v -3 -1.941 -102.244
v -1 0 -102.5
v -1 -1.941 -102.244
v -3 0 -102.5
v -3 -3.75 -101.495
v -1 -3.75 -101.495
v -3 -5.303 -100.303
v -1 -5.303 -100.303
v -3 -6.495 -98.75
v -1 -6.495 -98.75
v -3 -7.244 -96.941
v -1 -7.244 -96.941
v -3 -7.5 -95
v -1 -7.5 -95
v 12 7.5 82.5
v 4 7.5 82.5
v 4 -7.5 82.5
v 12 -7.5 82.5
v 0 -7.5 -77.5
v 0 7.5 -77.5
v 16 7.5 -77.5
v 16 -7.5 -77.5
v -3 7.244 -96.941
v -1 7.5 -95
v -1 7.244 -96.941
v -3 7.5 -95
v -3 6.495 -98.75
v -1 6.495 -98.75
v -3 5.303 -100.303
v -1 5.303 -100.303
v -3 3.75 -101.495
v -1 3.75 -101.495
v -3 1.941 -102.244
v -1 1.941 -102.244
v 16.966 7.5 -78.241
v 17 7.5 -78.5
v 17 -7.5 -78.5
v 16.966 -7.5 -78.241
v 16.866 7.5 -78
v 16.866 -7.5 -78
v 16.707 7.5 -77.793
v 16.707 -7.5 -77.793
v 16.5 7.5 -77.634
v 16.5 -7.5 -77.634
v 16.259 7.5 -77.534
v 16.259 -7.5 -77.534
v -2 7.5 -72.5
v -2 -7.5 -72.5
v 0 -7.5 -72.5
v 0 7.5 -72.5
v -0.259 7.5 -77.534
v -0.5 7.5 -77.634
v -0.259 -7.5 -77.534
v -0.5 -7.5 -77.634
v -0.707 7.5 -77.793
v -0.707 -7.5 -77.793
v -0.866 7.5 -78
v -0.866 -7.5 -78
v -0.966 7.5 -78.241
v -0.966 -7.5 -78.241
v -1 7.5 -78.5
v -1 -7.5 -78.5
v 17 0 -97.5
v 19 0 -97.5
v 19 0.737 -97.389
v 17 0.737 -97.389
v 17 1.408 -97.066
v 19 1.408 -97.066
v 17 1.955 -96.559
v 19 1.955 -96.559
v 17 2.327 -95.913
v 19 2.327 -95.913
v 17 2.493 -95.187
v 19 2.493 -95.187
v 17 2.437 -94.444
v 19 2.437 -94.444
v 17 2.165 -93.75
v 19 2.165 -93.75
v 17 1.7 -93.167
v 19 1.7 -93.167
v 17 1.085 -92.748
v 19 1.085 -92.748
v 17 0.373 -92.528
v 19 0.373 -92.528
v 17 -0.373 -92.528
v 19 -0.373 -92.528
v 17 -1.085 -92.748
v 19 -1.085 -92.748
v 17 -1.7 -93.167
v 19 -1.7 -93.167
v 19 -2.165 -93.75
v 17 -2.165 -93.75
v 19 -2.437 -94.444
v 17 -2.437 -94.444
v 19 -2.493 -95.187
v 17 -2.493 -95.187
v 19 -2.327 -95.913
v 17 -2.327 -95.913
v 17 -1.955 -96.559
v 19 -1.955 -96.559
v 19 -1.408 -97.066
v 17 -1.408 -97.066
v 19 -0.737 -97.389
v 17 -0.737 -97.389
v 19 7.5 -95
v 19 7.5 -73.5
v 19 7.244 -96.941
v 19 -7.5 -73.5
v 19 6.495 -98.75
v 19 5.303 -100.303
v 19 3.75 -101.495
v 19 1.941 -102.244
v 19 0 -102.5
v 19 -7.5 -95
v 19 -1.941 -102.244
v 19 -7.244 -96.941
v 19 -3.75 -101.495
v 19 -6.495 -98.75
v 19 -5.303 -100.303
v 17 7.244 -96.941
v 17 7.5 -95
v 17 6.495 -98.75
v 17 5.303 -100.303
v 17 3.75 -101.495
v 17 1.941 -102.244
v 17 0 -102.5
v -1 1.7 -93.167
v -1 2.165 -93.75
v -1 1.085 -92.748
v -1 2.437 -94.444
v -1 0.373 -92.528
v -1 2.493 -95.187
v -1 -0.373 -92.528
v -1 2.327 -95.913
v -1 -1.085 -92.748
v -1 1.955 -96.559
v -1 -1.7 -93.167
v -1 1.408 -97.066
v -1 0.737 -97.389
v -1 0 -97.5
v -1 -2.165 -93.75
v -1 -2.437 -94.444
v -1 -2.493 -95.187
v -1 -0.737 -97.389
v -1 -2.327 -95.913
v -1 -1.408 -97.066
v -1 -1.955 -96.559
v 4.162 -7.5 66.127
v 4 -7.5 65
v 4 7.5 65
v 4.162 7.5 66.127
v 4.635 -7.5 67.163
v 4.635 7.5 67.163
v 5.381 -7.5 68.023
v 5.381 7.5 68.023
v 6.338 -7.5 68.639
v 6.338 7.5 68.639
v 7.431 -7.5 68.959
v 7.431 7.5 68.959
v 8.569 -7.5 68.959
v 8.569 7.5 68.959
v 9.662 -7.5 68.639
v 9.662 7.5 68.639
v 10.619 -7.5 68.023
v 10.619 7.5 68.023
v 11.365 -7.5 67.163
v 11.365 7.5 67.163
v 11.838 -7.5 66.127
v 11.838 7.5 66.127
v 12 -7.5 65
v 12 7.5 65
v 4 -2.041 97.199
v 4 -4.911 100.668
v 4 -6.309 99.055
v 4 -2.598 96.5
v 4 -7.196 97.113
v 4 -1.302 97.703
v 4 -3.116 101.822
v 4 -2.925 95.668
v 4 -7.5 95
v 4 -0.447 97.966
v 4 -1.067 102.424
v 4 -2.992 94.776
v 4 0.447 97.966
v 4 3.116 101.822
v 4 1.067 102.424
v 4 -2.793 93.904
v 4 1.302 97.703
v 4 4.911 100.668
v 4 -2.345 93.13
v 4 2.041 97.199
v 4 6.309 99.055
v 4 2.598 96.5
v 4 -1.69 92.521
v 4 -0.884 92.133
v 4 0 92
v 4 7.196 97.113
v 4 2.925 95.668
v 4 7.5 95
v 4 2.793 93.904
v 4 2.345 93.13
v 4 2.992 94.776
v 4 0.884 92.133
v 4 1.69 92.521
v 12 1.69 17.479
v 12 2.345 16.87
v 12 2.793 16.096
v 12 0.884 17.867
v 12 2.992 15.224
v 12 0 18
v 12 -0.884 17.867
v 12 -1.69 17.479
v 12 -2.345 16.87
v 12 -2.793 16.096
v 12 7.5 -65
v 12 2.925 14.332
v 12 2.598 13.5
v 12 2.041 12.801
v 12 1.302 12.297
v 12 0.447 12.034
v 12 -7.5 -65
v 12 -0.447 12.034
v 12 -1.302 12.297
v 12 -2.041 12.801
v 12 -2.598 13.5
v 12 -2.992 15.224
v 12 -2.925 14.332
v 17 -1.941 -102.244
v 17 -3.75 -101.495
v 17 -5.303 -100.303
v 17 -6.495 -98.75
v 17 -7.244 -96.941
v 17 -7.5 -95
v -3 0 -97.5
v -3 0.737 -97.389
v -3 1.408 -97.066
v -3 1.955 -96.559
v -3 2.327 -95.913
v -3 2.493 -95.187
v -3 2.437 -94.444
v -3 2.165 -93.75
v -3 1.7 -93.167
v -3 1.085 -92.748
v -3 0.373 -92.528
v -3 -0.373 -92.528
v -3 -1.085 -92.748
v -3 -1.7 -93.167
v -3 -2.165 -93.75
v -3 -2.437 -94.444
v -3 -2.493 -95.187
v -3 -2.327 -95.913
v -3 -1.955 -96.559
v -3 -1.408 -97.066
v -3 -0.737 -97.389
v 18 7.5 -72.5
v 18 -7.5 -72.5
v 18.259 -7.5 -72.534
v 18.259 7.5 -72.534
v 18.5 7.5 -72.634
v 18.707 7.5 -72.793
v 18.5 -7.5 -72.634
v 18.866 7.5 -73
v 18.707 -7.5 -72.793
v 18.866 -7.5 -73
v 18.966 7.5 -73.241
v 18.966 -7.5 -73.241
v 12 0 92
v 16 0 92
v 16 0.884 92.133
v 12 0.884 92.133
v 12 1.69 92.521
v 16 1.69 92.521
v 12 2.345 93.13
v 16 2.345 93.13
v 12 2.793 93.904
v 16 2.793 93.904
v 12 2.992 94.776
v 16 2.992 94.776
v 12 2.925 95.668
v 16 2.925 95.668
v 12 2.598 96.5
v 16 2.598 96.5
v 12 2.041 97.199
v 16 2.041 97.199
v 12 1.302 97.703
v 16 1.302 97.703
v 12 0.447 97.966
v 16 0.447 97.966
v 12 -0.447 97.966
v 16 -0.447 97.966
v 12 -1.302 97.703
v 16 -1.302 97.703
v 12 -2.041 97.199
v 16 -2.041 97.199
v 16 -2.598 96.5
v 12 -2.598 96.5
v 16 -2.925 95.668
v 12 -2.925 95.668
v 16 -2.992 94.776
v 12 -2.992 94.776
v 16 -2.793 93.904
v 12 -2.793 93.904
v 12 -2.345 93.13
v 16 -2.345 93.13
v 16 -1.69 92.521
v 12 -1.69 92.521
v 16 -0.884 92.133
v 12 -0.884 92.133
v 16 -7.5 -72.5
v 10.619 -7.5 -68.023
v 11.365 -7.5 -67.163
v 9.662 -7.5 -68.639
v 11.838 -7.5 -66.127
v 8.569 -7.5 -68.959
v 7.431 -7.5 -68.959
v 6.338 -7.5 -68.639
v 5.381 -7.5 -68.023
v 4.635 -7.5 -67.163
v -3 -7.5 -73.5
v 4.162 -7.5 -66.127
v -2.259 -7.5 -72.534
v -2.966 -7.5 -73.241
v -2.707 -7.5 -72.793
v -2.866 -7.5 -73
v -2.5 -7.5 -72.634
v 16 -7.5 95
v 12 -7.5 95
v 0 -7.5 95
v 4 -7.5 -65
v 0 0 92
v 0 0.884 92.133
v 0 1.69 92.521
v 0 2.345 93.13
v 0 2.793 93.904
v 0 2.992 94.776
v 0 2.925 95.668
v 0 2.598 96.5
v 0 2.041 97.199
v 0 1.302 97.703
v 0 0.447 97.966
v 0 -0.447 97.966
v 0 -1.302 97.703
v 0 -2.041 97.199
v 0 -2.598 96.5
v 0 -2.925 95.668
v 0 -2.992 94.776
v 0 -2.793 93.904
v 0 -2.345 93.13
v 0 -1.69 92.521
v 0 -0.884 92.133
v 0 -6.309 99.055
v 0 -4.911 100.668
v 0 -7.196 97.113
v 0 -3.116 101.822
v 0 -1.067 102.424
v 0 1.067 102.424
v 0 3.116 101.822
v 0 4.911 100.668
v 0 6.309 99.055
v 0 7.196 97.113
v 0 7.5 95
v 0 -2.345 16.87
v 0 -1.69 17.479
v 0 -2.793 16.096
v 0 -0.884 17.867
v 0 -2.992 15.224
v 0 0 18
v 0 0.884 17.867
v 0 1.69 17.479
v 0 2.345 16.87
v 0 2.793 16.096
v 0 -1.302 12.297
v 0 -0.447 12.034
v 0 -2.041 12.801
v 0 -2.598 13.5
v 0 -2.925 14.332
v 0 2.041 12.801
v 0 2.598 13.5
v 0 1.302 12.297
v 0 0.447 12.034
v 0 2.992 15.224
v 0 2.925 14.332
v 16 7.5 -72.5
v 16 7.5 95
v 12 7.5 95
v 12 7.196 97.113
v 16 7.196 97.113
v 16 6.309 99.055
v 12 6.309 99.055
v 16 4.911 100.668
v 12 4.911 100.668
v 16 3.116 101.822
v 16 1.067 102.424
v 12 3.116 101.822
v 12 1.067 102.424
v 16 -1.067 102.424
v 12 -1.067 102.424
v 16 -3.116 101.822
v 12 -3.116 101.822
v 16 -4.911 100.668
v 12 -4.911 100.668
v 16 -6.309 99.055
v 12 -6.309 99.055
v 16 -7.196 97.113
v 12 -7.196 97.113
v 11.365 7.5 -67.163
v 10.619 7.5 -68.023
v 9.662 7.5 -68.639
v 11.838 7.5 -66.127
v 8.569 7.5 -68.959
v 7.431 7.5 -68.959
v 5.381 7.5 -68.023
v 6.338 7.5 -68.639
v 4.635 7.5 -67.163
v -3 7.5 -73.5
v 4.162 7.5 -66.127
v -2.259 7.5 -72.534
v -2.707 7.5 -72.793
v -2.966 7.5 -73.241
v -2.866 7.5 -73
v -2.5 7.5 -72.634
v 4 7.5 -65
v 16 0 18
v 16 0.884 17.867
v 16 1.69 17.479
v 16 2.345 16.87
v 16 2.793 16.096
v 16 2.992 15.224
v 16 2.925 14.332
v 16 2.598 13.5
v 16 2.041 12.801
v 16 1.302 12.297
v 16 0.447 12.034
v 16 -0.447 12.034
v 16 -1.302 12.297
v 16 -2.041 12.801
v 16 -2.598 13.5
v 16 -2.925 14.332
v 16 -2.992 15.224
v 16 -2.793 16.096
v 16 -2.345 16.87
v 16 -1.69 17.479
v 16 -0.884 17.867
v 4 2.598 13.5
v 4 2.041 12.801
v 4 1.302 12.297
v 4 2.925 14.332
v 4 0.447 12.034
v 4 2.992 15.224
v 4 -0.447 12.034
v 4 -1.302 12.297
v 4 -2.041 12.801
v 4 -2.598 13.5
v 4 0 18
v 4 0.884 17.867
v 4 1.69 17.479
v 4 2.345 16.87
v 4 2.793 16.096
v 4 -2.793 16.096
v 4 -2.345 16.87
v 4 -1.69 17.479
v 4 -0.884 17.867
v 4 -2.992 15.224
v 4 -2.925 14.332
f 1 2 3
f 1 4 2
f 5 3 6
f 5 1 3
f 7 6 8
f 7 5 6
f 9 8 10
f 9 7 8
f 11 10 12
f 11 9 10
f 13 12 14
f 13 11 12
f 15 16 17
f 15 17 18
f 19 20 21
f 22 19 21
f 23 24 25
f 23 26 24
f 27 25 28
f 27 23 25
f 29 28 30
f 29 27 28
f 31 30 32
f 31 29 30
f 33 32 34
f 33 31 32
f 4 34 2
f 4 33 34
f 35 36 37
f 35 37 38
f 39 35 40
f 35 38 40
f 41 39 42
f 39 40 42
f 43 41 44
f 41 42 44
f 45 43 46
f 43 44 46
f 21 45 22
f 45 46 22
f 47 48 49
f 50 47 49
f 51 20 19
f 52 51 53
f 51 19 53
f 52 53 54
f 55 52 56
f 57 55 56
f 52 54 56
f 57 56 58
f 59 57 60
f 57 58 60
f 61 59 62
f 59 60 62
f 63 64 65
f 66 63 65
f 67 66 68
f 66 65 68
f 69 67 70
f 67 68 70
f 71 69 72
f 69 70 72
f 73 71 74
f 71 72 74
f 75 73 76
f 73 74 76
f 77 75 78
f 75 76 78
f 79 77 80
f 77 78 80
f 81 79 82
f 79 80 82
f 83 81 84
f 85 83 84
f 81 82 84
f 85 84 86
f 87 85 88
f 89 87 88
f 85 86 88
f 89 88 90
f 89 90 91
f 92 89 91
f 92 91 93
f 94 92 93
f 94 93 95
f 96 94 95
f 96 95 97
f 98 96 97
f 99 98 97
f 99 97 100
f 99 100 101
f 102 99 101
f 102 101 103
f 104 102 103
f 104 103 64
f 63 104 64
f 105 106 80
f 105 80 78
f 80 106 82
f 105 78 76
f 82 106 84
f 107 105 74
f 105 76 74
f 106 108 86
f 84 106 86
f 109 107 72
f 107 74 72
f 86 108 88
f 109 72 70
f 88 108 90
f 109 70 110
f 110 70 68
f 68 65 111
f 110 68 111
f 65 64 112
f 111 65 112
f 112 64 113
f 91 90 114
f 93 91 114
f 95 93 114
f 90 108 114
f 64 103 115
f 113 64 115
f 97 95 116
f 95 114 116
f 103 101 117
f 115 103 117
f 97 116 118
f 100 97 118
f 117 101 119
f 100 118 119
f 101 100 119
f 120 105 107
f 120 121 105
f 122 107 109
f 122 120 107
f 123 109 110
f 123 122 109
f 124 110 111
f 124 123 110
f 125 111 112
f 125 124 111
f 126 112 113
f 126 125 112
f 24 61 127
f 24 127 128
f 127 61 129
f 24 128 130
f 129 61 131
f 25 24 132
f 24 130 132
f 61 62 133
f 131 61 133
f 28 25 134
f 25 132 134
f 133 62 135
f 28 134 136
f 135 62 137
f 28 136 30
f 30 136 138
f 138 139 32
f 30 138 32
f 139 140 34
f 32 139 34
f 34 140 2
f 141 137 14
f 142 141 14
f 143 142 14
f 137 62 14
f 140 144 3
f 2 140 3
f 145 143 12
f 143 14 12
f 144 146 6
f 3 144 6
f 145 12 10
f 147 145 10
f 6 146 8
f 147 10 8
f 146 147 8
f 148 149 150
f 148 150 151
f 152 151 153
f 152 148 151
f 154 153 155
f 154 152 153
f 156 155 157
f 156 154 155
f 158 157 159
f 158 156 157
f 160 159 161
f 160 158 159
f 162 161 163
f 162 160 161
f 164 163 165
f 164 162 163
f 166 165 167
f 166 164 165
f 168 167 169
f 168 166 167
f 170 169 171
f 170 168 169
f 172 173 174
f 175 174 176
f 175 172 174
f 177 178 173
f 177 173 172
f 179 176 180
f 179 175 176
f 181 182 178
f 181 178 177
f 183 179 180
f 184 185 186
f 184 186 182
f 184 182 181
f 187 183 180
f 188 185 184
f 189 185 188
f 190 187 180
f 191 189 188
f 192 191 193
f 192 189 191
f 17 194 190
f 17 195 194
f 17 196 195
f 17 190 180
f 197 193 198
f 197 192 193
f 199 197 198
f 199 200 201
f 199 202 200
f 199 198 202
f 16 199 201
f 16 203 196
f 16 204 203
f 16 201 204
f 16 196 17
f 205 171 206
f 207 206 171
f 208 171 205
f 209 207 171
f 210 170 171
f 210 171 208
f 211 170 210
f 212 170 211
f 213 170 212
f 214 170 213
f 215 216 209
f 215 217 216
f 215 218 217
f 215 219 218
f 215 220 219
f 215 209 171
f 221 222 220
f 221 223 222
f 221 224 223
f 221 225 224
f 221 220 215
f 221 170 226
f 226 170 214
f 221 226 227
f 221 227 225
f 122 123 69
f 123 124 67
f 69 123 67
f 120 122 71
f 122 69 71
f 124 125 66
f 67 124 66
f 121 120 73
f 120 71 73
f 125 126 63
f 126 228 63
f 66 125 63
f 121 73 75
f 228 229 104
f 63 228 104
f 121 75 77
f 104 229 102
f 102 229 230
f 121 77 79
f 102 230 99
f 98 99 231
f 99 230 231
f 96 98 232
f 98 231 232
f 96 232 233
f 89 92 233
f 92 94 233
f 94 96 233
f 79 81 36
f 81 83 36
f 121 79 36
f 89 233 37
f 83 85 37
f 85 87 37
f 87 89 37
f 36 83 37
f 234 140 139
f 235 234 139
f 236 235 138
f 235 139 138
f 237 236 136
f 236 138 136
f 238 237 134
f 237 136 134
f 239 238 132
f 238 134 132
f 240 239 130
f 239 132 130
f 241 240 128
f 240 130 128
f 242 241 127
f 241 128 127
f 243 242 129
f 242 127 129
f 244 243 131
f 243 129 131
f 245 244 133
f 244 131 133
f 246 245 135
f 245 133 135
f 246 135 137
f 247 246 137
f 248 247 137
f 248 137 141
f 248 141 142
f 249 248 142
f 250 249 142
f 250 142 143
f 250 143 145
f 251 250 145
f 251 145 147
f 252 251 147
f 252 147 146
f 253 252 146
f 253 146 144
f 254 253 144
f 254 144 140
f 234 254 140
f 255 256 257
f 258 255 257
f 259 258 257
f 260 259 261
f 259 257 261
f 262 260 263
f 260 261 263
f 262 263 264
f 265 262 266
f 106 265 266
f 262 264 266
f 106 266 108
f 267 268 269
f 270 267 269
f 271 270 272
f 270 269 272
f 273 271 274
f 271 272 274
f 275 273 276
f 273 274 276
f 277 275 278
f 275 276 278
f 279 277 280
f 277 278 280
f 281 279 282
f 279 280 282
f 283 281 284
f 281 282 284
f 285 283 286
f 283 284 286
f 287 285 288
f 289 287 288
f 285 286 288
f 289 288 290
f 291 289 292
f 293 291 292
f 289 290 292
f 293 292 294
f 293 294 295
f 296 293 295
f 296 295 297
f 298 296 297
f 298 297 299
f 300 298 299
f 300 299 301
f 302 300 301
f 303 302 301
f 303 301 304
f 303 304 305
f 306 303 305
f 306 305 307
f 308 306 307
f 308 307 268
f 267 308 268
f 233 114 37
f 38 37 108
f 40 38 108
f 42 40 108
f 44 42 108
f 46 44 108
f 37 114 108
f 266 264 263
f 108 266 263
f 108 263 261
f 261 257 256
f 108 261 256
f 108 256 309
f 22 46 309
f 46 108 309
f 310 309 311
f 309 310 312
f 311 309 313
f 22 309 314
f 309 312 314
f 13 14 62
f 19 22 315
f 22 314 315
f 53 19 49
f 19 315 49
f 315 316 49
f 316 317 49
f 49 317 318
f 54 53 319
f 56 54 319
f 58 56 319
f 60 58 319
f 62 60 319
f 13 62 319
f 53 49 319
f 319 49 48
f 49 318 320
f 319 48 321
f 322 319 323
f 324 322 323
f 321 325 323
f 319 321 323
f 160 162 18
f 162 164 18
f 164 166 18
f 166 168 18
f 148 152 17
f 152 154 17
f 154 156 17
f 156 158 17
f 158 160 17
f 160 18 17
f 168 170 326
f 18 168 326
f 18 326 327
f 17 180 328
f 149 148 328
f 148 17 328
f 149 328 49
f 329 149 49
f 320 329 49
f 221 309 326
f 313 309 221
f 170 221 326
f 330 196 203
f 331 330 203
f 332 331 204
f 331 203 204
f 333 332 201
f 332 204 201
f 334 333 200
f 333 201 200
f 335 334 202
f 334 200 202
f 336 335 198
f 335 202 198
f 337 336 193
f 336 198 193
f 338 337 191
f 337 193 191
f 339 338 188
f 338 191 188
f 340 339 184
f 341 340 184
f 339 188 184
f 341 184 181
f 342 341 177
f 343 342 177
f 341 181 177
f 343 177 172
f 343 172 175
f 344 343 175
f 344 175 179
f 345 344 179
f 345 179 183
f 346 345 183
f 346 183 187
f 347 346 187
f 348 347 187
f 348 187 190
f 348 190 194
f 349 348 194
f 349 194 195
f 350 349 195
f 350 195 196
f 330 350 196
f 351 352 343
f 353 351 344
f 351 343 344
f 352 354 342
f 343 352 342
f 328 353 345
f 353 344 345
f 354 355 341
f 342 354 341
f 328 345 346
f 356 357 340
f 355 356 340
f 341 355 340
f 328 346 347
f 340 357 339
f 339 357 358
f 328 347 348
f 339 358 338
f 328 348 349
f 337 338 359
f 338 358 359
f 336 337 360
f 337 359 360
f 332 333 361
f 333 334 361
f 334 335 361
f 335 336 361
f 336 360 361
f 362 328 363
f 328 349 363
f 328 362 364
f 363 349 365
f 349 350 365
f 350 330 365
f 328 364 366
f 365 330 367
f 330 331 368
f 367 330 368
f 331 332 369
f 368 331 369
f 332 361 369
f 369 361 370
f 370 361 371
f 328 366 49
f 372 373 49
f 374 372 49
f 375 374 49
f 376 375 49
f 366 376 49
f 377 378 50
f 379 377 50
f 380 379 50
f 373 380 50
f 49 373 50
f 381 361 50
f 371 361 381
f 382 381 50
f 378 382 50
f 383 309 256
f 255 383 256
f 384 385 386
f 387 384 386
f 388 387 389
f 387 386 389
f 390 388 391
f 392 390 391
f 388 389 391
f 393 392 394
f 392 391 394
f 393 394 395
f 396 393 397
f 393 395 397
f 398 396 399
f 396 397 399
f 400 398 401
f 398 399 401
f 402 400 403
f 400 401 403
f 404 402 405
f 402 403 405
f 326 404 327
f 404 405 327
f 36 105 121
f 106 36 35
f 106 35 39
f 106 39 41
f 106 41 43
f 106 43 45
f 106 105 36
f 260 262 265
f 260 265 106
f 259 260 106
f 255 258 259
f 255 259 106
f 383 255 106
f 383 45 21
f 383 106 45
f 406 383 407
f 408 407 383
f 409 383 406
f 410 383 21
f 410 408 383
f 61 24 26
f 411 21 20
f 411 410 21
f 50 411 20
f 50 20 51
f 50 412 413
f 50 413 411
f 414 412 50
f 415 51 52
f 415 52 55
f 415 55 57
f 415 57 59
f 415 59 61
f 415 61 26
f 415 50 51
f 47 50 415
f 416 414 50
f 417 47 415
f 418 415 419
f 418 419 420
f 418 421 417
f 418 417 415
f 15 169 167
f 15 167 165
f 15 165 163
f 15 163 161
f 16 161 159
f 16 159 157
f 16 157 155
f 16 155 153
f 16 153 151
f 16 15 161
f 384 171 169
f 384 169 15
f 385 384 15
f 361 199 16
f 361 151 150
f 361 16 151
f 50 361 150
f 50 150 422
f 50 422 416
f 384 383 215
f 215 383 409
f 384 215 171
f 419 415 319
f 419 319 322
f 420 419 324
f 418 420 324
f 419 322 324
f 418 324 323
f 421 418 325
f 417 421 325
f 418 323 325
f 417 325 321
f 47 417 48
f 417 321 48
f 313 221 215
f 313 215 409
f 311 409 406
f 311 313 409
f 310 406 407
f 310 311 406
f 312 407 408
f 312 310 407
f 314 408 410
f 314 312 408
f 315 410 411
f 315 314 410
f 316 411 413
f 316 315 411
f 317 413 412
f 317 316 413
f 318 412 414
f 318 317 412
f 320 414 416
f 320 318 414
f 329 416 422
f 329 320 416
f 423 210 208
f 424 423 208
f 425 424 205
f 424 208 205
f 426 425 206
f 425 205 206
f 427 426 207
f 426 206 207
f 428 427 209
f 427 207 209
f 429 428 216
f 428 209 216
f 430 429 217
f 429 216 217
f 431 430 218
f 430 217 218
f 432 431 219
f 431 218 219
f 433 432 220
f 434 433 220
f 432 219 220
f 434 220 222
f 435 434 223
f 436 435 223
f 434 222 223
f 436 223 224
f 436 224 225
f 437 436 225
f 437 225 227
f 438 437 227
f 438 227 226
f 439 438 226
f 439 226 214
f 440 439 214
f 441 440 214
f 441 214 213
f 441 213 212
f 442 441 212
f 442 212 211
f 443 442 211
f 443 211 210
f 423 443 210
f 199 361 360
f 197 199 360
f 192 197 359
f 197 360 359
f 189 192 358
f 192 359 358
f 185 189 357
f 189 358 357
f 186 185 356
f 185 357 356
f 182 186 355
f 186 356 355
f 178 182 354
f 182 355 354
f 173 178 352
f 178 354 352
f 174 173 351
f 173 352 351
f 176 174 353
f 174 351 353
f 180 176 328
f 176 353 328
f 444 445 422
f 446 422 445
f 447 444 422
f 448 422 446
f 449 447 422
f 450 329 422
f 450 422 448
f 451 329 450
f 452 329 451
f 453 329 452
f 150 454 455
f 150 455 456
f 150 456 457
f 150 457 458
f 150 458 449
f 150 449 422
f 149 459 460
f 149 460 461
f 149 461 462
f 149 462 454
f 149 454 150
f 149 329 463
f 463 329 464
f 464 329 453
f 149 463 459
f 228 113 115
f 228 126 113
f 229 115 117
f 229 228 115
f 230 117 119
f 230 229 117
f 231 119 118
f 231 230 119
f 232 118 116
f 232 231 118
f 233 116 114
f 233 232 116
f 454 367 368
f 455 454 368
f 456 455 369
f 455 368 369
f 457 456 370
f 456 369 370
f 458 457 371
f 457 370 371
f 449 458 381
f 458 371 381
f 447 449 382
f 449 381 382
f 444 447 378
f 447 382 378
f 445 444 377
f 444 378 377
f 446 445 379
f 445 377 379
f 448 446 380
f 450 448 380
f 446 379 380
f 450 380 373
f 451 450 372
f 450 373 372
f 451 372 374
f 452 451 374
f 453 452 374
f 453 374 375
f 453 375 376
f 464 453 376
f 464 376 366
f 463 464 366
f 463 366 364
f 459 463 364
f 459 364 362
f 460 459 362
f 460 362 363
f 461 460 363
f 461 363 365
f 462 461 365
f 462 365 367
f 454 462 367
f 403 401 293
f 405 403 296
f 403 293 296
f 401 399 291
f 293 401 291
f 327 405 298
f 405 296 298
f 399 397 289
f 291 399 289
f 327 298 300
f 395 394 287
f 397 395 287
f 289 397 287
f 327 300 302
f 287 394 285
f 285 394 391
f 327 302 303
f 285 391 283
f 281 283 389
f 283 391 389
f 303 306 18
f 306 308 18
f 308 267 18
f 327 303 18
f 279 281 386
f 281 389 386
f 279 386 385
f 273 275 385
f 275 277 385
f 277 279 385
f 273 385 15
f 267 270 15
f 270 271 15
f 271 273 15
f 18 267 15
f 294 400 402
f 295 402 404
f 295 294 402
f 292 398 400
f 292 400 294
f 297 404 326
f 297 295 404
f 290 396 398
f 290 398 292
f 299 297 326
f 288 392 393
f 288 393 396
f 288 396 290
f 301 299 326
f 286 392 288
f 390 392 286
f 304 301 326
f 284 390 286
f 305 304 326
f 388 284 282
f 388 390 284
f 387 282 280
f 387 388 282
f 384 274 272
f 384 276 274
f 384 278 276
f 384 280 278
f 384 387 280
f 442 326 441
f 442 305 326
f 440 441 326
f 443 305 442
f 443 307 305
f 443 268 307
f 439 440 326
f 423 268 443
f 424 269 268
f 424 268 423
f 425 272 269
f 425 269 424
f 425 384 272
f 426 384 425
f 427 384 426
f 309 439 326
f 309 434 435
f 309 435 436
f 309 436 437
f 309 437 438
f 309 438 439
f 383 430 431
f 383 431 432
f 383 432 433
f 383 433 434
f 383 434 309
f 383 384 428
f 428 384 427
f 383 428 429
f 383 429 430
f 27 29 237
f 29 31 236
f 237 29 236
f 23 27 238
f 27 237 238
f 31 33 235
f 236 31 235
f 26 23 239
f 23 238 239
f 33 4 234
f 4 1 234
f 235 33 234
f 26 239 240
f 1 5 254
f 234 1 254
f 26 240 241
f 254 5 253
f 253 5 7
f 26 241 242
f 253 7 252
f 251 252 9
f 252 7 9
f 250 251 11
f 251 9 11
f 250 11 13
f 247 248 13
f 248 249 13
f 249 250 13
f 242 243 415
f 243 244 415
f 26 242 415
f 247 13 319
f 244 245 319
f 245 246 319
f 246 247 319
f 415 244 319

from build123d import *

# Parameters (mm, degrees)
EXTRUDE_1_DEPTH     = 16
SKETCH_3_W          = 8
SKETCH_3_H          = 20
SKETCH_3_H_2        = 25
CUT_EXTRUDE_1_DEPTH = 105.820083953
SKETCH_4_R          = 3
SKETCH_4_R_2        = 6
CUT_EXTRUDE_2_DEPTH = 105.012018536
CUT_EXTRUDE_3_DEPTH = 105.820083953
SKETCH_6_R          = 3
CUT_EXTRUDE_4_DEPTH = 105.012018536
EXTRUDE_2_DEPTH     = 15
CUT_EXTRUDE_START   = -15
CUT_EXTRUDE_5_DEPTH = 15
FILLET_1_R          = 7.5
SKETCH_9_R          = 2.5
CUT_EXTRUDE_6_DEPTH = 106.102331087


with BuildPart() as part:
    # 草图2 → 凸台-拉伸1 (new body)
    with BuildSketch(Plane(origin=(0, 0, 0), x_dir=(0, 0, -1), z_dir=(1, 0, 0))):
        with BuildLine():
            Line((-95, -7.5), (95, -7.5))
            ThreePointArc((95, -7.5), (102.5, 0), (95, 7.5))
            Line((95, 7.5), (-95, 7.5))
            ThreePointArc((-95, 7.5), (-102.5, 0), (-95, -7.5))
        make_face()
    extrude(amount=EXTRUDE_1_DEPTH)

    # 草图3 → 切除-拉伸1 (cut, through all)
    with BuildSketch(Plane(origin=(0, 7.5, 0), x_dir=(1, 0, 0), z_dir=(0, 1, 0))):
        with Locations((8, -92.5)):
            Rectangle(SKETCH_3_W, SKETCH_3_H)
        with Locations((8, 90)):
            Rectangle(SKETCH_3_W, SKETCH_3_H_2)
    extrude(amount=-CUT_EXTRUDE_1_DEPTH, mode=Mode.SUBTRACT)

    # 草图4 → 切除-拉伸2 (cut, through all)
    with BuildSketch(Plane(origin=(16, 0, 0), x_dir=(0, 0, -1), z_dir=(1, 0, 0))):
        with Locations((-95, 0)):
            Circle(SKETCH_4_R)
        with Locations((95, 0)):
            Circle(SKETCH_4_R_2)
    extrude(amount=-CUT_EXTRUDE_2_DEPTH, mode=Mode.SUBTRACT)

    # 草图5 → 切除-拉伸3 (cut, through all)
    with BuildSketch(Plane.XZ.offset(7.5)):
        with BuildLine():
            Line((12, 65), (12, -65))
            ThreePointArc((12, -65), (8, -69), (4, -65))
            Line((4, -65), (4, 65))
            ThreePointArc((4, 65), (8, 69), (12, 65))
        make_face()
    extrude(amount=-CUT_EXTRUDE_3_DEPTH, mode=Mode.SUBTRACT)

    # 草图6 → 切除-拉伸4 (cut, through all)
    with BuildSketch(Plane.ZY):
        with Locations((15, 0)):
            Circle(SKETCH_6_R)
    extrude(amount=-CUT_EXTRUDE_4_DEPTH, mode=Mode.SUBTRACT)

    # 草图7 → 凸台-拉伸2 (add)
    with BuildSketch(Plane.XZ.offset(7.5)):
        with BuildLine():
            Line((7.022963208, -77.5), (0, -77.5))
            ThreePointArc((0, -77.5), (-0.707106781, -77.792893219), (-1, -78.5))
            Line((-1, -78.5), (-1, -102.5))
            Line((-1, -102.5), (-3, -102.5))
            Line((-3, -102.5), (-3, -73.5))
            ThreePointArc((-3, -73.5), (-2.707106781, -72.792893219), (-2, -72.5))
            Line((-2, -72.5), (0, -72.5))
            Line((0, -72.5), (0, -76.537771908))
            Line((0, -76.537771908), (16, -76.537771908))
            Line((16, -76.537771908), (16, -72.5))
            Line((16, -72.5), (18, -72.5))
            ThreePointArc((18, -72.5), (18.707106781, -72.792893219), (19, -73.5))
            Line((19, -73.5), (19, -102.5))
            Line((19, -102.5), (17, -102.5))
            Line((17, -102.5), (17, -78.5))
            ThreePointArc((17, -78.5), (16.707106781, -77.792893219), (16, -77.5))
            Line((16, -77.5), (8.977036792, -77.5))
            Line((8.977036792, -77.5), (7.022963208, -77.5))
        make_face()
    extrude(amount=-EXTRUDE_2_DEPTH)

    # 草图8 → 切除-拉伸5 (cut)
    with BuildSketch(Plane(origin=(0, -7.5, 0), x_dir=(-1, 0, 0), z_dir=(0, -1, 0)).offset(CUT_EXTRUDE_START)):
        with BuildLine():
            Line((-17, 102.5), (1, 102.5))
            Line((1, 102.5), (1, 78.5))
            ThreePointArc((1, 78.5), (0.707106781, 77.792893219), (0, 77.5))
            Line((0, 77.5), (-16, 77.5))
            ThreePointArc((-16, 77.5), (-16.707106781, 77.792893219), (-17, 78.5))
            Line((-17, 78.5), (-17, 102.5))
        make_face()
    extrude(amount=CUT_EXTRUDE_5_DEPTH, mode=Mode.SUBTRACT)

    # 圆角1
    fillet_1_edges = [part.edges().sort_by_distance(p)[0] for p in [
        (18, 7.5, -102.5),
        (18, -7.5, -102.5),
        (-2, 7.5, -102.5),
        (-2, -7.5, -102.5),
    ]]
    fillet(fillet_1_edges, radius=FILLET_1_R - 0.0001)  # a hair under: the kernel refuses the full size

    # 草图9 → 切除-拉伸6 (cut, through all)
    with BuildSketch(Plane(origin=(19, 0, 0), x_dir=(0, 0, -1), z_dir=(1, 0, 0))):
        with Locations((95, 0)):
            Circle(SKETCH_9_R)
    extrude(amount=-CUT_EXTRUDE_6_DEPTH, mode=Mode.SUBTRACT)


solid = part.part
